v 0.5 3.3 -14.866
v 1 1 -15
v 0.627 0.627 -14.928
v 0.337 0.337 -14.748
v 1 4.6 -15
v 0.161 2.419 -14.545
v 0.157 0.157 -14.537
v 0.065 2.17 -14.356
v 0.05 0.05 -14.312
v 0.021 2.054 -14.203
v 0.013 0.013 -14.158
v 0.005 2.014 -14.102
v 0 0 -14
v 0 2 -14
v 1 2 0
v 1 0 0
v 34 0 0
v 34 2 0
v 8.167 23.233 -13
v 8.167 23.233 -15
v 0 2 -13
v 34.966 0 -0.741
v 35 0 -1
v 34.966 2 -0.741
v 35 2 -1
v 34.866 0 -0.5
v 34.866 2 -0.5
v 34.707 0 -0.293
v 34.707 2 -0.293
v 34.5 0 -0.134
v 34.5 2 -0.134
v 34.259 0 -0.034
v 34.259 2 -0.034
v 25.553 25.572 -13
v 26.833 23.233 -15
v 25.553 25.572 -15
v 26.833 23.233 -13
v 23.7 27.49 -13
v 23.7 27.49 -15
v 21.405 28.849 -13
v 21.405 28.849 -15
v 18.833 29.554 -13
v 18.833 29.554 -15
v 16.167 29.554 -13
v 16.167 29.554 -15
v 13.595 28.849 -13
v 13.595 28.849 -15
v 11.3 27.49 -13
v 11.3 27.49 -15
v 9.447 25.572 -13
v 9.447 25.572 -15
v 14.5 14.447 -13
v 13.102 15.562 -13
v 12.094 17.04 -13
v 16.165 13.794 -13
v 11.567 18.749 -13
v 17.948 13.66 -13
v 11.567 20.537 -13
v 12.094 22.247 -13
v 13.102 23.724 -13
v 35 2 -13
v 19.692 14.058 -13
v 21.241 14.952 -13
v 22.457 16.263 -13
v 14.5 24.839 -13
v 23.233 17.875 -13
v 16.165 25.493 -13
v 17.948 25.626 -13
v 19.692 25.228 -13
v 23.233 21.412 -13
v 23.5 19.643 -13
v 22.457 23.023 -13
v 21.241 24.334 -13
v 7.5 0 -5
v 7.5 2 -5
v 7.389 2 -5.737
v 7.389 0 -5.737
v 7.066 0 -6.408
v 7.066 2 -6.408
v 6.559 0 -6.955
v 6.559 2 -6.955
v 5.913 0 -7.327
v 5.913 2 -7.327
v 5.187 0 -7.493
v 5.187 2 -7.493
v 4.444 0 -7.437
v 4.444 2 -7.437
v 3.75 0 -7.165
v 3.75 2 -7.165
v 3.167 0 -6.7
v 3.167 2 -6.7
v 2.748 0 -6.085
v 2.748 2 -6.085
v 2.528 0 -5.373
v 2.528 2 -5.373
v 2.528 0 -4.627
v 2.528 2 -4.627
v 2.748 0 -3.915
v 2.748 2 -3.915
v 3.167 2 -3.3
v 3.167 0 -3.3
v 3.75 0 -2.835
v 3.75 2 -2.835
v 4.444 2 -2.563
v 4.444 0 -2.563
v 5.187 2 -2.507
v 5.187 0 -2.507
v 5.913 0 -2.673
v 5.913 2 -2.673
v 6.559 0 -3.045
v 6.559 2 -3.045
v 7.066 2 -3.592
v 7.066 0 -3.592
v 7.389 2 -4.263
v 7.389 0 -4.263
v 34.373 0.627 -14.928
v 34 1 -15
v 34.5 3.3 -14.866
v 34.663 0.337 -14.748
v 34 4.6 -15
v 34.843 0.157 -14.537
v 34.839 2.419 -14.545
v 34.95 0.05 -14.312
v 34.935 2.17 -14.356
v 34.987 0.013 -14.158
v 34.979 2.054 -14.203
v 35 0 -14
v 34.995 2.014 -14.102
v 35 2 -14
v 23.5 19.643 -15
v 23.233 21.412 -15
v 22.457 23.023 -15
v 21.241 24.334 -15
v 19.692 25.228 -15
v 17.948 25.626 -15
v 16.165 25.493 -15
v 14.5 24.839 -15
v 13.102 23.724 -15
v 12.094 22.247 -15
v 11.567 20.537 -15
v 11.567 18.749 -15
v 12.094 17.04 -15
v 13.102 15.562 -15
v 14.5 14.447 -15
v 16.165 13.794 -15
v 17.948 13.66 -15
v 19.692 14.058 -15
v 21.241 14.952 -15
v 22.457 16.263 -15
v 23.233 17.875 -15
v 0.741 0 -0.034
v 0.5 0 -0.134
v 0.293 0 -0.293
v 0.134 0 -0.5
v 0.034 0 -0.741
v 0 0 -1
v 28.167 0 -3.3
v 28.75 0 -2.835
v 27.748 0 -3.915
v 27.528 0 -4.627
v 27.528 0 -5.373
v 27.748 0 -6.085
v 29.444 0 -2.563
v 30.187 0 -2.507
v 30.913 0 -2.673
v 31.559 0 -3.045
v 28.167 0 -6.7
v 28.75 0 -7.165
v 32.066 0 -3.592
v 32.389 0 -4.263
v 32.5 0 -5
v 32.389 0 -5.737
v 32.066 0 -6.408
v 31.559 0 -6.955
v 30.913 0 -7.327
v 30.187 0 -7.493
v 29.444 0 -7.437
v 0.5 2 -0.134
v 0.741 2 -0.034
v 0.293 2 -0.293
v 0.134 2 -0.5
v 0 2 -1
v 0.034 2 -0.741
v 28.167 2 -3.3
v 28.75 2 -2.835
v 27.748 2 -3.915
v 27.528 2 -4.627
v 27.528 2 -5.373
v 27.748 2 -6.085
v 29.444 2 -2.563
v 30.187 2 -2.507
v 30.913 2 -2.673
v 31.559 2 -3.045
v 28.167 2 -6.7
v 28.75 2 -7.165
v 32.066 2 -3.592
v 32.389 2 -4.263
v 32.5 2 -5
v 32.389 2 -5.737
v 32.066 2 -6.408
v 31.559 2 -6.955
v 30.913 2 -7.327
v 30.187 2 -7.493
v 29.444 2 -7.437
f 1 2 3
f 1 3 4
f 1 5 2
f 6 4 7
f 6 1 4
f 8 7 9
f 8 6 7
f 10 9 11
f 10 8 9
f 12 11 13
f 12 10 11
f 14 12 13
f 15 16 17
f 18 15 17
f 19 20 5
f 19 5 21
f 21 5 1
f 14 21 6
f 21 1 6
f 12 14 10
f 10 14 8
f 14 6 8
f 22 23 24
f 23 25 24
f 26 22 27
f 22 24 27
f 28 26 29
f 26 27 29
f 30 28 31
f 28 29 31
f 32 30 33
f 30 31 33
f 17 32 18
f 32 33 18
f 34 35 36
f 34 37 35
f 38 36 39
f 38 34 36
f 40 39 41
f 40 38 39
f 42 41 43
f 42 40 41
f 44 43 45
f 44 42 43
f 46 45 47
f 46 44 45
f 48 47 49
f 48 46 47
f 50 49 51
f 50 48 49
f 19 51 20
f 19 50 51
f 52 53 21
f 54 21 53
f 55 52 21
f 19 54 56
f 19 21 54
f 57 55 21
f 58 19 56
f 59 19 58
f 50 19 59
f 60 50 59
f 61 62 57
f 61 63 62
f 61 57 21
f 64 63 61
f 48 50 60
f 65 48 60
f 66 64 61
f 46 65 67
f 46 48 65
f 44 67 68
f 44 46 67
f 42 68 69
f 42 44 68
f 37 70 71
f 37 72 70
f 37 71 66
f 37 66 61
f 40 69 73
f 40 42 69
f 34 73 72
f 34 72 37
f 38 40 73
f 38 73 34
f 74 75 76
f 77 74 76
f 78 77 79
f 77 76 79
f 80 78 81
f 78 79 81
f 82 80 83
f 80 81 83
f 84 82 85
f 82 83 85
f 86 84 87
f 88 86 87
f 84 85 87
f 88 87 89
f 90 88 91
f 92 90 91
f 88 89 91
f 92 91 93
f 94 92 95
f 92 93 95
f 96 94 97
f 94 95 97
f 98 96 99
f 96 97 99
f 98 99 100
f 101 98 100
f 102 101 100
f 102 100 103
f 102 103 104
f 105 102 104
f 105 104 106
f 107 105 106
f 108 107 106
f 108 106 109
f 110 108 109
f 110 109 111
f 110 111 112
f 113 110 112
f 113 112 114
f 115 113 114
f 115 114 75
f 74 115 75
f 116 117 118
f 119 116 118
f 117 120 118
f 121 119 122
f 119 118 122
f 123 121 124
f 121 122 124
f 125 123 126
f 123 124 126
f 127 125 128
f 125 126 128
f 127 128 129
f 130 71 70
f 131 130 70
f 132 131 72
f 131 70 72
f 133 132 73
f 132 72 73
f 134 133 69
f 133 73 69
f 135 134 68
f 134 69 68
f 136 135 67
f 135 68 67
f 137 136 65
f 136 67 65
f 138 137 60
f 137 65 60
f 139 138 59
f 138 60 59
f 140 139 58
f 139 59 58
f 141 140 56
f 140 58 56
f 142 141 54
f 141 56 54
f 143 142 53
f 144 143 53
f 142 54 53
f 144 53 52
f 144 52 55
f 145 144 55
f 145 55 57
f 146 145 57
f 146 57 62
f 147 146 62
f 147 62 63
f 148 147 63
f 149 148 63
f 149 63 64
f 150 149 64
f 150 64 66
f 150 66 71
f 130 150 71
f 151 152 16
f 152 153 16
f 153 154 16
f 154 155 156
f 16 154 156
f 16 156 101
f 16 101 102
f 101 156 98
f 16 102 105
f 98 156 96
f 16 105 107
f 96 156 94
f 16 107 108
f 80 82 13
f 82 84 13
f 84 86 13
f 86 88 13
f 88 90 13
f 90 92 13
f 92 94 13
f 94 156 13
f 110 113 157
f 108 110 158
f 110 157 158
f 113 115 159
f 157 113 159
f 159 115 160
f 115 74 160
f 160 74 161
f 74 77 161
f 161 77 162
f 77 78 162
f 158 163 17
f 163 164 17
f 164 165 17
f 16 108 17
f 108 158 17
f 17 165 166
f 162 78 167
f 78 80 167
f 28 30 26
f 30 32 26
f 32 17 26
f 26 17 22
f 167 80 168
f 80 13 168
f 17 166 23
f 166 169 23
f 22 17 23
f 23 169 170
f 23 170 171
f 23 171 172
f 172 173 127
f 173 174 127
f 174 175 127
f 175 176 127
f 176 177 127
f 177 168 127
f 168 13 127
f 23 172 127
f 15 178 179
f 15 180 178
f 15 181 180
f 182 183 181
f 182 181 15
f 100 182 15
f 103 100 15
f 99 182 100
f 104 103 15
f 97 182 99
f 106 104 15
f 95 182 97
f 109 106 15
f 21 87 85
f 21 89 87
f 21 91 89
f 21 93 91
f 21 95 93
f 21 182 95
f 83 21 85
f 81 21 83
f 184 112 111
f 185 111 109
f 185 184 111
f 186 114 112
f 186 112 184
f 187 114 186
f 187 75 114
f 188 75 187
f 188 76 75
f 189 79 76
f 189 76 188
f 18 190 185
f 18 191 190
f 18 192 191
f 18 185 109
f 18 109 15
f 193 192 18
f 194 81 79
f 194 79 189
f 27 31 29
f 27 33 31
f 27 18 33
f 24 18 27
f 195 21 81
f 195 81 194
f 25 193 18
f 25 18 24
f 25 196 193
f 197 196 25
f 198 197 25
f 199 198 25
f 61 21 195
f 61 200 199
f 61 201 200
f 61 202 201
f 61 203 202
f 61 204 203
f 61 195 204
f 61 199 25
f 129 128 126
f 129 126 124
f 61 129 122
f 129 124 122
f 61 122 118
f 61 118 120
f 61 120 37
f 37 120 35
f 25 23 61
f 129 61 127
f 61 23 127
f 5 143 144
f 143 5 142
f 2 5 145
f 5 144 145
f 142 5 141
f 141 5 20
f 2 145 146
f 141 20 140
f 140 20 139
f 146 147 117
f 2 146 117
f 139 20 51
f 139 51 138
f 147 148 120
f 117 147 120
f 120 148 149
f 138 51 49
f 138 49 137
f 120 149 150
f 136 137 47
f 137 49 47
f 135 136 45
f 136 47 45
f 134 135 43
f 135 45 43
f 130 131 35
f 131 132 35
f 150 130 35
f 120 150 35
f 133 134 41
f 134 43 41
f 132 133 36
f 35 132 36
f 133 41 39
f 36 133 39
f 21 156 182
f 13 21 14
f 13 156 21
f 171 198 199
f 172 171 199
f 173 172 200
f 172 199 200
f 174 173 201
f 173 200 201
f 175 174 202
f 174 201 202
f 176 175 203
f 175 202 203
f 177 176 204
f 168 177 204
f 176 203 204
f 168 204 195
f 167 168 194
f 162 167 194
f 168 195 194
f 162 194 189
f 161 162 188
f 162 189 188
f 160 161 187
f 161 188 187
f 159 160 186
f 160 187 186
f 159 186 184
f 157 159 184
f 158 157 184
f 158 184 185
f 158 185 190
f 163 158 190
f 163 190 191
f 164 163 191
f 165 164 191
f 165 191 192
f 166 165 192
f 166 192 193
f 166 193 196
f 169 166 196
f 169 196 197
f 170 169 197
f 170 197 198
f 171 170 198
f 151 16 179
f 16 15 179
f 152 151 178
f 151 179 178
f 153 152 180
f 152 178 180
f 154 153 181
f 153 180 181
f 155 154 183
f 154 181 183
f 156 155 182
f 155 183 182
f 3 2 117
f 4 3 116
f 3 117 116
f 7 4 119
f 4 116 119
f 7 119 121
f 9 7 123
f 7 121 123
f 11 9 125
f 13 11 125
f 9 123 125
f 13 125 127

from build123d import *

# Parameters (mm, degrees)
SKETCH1_W           = 35
SKETCH1_H           = 15
BOSS_EXTRUDE1_DEPTH = 2
BOSS_EXTRUDE2_DEPTH = 2
FILLET1_R           = 10
FILLET2_R           = 1
FILLET3_R           = 1
SKETCH4_R           = 2.5
CUT_EXTRUDE1_DEPTH  = 3
SKETCH5_R           = 6
CUT_EXTRUDE2_DEPTH  = 3


with BuildPart() as part:
    # Sketch1 → Boss-Extrude1 (new body)
    with BuildSketch(Plane(origin=(0, 0, 0), x_dir=(1, 0, 0), z_dir=(0, 1, 0))):
        with Locations((17.5, 7.5)):
            Rectangle(SKETCH1_W, SKETCH1_H)
    extrude(amount=BOSS_EXTRUDE1_DEPTH)

    # Sketch3 → Boss-Extrude2 (add)
    with BuildSketch(Plane(origin=(0, 0, -15), x_dir=(-1, 0, 0), z_dir=(0, 0, -1))):
        Polygon((0, 2), (-35, 2), (-17.5, 47.5), align=None)
    extrude(amount=-BOSS_EXTRUDE2_DEPTH)

    # Fillet1
    fillet1_edges = [part.edges().sort_by_distance(p)[0] for p in [
        (17.5, 47.5, -14),
    ]]
    fillet(fillet1_edges, radius=FILLET1_R)

    # Fillet2
    fillet2_edges = [part.edges().sort_by_distance(p)[0] for p in [
        (17.5, 0, -15),
        (0, 1, -15),
        (35, 1, -15),
    ]]
    fillet(fillet2_edges, radius=FILLET2_R)

    # Fillet3
    fillet3_edges = [part.edges().sort_by_distance(p)[0] for p in [
        (35, 1, 0),
        (0, 1, 0),
    ]]
    fillet(fillet3_edges, radius=FILLET3_R)

    # Sketch4 → Cut-Extrude1 (cut, through all)
    with BuildSketch(Plane(origin=(0, 2, 0), x_dir=(1, 0, 0), z_dir=(0, 1, 0))):
        with Locations((5, 5)):
            Circle(SKETCH4_R)
        with Locations((30, 5)):
            Circle(SKETCH4_R)
    extrude(amount=-CUT_EXTRUDE1_DEPTH, mode=Mode.SUBTRACT)

    # Sketch5 → Cut-Extrude2 (cut, through all)
    with BuildSketch(Plane.XY.offset(-13)):
        with Locations((17.5, 19.643223446)):
            Circle(SKETCH5_R)
    extrude(amount=-CUT_EXTRUDE2_DEPTH, mode=Mode.SUBTRACT)


solid = part.part
